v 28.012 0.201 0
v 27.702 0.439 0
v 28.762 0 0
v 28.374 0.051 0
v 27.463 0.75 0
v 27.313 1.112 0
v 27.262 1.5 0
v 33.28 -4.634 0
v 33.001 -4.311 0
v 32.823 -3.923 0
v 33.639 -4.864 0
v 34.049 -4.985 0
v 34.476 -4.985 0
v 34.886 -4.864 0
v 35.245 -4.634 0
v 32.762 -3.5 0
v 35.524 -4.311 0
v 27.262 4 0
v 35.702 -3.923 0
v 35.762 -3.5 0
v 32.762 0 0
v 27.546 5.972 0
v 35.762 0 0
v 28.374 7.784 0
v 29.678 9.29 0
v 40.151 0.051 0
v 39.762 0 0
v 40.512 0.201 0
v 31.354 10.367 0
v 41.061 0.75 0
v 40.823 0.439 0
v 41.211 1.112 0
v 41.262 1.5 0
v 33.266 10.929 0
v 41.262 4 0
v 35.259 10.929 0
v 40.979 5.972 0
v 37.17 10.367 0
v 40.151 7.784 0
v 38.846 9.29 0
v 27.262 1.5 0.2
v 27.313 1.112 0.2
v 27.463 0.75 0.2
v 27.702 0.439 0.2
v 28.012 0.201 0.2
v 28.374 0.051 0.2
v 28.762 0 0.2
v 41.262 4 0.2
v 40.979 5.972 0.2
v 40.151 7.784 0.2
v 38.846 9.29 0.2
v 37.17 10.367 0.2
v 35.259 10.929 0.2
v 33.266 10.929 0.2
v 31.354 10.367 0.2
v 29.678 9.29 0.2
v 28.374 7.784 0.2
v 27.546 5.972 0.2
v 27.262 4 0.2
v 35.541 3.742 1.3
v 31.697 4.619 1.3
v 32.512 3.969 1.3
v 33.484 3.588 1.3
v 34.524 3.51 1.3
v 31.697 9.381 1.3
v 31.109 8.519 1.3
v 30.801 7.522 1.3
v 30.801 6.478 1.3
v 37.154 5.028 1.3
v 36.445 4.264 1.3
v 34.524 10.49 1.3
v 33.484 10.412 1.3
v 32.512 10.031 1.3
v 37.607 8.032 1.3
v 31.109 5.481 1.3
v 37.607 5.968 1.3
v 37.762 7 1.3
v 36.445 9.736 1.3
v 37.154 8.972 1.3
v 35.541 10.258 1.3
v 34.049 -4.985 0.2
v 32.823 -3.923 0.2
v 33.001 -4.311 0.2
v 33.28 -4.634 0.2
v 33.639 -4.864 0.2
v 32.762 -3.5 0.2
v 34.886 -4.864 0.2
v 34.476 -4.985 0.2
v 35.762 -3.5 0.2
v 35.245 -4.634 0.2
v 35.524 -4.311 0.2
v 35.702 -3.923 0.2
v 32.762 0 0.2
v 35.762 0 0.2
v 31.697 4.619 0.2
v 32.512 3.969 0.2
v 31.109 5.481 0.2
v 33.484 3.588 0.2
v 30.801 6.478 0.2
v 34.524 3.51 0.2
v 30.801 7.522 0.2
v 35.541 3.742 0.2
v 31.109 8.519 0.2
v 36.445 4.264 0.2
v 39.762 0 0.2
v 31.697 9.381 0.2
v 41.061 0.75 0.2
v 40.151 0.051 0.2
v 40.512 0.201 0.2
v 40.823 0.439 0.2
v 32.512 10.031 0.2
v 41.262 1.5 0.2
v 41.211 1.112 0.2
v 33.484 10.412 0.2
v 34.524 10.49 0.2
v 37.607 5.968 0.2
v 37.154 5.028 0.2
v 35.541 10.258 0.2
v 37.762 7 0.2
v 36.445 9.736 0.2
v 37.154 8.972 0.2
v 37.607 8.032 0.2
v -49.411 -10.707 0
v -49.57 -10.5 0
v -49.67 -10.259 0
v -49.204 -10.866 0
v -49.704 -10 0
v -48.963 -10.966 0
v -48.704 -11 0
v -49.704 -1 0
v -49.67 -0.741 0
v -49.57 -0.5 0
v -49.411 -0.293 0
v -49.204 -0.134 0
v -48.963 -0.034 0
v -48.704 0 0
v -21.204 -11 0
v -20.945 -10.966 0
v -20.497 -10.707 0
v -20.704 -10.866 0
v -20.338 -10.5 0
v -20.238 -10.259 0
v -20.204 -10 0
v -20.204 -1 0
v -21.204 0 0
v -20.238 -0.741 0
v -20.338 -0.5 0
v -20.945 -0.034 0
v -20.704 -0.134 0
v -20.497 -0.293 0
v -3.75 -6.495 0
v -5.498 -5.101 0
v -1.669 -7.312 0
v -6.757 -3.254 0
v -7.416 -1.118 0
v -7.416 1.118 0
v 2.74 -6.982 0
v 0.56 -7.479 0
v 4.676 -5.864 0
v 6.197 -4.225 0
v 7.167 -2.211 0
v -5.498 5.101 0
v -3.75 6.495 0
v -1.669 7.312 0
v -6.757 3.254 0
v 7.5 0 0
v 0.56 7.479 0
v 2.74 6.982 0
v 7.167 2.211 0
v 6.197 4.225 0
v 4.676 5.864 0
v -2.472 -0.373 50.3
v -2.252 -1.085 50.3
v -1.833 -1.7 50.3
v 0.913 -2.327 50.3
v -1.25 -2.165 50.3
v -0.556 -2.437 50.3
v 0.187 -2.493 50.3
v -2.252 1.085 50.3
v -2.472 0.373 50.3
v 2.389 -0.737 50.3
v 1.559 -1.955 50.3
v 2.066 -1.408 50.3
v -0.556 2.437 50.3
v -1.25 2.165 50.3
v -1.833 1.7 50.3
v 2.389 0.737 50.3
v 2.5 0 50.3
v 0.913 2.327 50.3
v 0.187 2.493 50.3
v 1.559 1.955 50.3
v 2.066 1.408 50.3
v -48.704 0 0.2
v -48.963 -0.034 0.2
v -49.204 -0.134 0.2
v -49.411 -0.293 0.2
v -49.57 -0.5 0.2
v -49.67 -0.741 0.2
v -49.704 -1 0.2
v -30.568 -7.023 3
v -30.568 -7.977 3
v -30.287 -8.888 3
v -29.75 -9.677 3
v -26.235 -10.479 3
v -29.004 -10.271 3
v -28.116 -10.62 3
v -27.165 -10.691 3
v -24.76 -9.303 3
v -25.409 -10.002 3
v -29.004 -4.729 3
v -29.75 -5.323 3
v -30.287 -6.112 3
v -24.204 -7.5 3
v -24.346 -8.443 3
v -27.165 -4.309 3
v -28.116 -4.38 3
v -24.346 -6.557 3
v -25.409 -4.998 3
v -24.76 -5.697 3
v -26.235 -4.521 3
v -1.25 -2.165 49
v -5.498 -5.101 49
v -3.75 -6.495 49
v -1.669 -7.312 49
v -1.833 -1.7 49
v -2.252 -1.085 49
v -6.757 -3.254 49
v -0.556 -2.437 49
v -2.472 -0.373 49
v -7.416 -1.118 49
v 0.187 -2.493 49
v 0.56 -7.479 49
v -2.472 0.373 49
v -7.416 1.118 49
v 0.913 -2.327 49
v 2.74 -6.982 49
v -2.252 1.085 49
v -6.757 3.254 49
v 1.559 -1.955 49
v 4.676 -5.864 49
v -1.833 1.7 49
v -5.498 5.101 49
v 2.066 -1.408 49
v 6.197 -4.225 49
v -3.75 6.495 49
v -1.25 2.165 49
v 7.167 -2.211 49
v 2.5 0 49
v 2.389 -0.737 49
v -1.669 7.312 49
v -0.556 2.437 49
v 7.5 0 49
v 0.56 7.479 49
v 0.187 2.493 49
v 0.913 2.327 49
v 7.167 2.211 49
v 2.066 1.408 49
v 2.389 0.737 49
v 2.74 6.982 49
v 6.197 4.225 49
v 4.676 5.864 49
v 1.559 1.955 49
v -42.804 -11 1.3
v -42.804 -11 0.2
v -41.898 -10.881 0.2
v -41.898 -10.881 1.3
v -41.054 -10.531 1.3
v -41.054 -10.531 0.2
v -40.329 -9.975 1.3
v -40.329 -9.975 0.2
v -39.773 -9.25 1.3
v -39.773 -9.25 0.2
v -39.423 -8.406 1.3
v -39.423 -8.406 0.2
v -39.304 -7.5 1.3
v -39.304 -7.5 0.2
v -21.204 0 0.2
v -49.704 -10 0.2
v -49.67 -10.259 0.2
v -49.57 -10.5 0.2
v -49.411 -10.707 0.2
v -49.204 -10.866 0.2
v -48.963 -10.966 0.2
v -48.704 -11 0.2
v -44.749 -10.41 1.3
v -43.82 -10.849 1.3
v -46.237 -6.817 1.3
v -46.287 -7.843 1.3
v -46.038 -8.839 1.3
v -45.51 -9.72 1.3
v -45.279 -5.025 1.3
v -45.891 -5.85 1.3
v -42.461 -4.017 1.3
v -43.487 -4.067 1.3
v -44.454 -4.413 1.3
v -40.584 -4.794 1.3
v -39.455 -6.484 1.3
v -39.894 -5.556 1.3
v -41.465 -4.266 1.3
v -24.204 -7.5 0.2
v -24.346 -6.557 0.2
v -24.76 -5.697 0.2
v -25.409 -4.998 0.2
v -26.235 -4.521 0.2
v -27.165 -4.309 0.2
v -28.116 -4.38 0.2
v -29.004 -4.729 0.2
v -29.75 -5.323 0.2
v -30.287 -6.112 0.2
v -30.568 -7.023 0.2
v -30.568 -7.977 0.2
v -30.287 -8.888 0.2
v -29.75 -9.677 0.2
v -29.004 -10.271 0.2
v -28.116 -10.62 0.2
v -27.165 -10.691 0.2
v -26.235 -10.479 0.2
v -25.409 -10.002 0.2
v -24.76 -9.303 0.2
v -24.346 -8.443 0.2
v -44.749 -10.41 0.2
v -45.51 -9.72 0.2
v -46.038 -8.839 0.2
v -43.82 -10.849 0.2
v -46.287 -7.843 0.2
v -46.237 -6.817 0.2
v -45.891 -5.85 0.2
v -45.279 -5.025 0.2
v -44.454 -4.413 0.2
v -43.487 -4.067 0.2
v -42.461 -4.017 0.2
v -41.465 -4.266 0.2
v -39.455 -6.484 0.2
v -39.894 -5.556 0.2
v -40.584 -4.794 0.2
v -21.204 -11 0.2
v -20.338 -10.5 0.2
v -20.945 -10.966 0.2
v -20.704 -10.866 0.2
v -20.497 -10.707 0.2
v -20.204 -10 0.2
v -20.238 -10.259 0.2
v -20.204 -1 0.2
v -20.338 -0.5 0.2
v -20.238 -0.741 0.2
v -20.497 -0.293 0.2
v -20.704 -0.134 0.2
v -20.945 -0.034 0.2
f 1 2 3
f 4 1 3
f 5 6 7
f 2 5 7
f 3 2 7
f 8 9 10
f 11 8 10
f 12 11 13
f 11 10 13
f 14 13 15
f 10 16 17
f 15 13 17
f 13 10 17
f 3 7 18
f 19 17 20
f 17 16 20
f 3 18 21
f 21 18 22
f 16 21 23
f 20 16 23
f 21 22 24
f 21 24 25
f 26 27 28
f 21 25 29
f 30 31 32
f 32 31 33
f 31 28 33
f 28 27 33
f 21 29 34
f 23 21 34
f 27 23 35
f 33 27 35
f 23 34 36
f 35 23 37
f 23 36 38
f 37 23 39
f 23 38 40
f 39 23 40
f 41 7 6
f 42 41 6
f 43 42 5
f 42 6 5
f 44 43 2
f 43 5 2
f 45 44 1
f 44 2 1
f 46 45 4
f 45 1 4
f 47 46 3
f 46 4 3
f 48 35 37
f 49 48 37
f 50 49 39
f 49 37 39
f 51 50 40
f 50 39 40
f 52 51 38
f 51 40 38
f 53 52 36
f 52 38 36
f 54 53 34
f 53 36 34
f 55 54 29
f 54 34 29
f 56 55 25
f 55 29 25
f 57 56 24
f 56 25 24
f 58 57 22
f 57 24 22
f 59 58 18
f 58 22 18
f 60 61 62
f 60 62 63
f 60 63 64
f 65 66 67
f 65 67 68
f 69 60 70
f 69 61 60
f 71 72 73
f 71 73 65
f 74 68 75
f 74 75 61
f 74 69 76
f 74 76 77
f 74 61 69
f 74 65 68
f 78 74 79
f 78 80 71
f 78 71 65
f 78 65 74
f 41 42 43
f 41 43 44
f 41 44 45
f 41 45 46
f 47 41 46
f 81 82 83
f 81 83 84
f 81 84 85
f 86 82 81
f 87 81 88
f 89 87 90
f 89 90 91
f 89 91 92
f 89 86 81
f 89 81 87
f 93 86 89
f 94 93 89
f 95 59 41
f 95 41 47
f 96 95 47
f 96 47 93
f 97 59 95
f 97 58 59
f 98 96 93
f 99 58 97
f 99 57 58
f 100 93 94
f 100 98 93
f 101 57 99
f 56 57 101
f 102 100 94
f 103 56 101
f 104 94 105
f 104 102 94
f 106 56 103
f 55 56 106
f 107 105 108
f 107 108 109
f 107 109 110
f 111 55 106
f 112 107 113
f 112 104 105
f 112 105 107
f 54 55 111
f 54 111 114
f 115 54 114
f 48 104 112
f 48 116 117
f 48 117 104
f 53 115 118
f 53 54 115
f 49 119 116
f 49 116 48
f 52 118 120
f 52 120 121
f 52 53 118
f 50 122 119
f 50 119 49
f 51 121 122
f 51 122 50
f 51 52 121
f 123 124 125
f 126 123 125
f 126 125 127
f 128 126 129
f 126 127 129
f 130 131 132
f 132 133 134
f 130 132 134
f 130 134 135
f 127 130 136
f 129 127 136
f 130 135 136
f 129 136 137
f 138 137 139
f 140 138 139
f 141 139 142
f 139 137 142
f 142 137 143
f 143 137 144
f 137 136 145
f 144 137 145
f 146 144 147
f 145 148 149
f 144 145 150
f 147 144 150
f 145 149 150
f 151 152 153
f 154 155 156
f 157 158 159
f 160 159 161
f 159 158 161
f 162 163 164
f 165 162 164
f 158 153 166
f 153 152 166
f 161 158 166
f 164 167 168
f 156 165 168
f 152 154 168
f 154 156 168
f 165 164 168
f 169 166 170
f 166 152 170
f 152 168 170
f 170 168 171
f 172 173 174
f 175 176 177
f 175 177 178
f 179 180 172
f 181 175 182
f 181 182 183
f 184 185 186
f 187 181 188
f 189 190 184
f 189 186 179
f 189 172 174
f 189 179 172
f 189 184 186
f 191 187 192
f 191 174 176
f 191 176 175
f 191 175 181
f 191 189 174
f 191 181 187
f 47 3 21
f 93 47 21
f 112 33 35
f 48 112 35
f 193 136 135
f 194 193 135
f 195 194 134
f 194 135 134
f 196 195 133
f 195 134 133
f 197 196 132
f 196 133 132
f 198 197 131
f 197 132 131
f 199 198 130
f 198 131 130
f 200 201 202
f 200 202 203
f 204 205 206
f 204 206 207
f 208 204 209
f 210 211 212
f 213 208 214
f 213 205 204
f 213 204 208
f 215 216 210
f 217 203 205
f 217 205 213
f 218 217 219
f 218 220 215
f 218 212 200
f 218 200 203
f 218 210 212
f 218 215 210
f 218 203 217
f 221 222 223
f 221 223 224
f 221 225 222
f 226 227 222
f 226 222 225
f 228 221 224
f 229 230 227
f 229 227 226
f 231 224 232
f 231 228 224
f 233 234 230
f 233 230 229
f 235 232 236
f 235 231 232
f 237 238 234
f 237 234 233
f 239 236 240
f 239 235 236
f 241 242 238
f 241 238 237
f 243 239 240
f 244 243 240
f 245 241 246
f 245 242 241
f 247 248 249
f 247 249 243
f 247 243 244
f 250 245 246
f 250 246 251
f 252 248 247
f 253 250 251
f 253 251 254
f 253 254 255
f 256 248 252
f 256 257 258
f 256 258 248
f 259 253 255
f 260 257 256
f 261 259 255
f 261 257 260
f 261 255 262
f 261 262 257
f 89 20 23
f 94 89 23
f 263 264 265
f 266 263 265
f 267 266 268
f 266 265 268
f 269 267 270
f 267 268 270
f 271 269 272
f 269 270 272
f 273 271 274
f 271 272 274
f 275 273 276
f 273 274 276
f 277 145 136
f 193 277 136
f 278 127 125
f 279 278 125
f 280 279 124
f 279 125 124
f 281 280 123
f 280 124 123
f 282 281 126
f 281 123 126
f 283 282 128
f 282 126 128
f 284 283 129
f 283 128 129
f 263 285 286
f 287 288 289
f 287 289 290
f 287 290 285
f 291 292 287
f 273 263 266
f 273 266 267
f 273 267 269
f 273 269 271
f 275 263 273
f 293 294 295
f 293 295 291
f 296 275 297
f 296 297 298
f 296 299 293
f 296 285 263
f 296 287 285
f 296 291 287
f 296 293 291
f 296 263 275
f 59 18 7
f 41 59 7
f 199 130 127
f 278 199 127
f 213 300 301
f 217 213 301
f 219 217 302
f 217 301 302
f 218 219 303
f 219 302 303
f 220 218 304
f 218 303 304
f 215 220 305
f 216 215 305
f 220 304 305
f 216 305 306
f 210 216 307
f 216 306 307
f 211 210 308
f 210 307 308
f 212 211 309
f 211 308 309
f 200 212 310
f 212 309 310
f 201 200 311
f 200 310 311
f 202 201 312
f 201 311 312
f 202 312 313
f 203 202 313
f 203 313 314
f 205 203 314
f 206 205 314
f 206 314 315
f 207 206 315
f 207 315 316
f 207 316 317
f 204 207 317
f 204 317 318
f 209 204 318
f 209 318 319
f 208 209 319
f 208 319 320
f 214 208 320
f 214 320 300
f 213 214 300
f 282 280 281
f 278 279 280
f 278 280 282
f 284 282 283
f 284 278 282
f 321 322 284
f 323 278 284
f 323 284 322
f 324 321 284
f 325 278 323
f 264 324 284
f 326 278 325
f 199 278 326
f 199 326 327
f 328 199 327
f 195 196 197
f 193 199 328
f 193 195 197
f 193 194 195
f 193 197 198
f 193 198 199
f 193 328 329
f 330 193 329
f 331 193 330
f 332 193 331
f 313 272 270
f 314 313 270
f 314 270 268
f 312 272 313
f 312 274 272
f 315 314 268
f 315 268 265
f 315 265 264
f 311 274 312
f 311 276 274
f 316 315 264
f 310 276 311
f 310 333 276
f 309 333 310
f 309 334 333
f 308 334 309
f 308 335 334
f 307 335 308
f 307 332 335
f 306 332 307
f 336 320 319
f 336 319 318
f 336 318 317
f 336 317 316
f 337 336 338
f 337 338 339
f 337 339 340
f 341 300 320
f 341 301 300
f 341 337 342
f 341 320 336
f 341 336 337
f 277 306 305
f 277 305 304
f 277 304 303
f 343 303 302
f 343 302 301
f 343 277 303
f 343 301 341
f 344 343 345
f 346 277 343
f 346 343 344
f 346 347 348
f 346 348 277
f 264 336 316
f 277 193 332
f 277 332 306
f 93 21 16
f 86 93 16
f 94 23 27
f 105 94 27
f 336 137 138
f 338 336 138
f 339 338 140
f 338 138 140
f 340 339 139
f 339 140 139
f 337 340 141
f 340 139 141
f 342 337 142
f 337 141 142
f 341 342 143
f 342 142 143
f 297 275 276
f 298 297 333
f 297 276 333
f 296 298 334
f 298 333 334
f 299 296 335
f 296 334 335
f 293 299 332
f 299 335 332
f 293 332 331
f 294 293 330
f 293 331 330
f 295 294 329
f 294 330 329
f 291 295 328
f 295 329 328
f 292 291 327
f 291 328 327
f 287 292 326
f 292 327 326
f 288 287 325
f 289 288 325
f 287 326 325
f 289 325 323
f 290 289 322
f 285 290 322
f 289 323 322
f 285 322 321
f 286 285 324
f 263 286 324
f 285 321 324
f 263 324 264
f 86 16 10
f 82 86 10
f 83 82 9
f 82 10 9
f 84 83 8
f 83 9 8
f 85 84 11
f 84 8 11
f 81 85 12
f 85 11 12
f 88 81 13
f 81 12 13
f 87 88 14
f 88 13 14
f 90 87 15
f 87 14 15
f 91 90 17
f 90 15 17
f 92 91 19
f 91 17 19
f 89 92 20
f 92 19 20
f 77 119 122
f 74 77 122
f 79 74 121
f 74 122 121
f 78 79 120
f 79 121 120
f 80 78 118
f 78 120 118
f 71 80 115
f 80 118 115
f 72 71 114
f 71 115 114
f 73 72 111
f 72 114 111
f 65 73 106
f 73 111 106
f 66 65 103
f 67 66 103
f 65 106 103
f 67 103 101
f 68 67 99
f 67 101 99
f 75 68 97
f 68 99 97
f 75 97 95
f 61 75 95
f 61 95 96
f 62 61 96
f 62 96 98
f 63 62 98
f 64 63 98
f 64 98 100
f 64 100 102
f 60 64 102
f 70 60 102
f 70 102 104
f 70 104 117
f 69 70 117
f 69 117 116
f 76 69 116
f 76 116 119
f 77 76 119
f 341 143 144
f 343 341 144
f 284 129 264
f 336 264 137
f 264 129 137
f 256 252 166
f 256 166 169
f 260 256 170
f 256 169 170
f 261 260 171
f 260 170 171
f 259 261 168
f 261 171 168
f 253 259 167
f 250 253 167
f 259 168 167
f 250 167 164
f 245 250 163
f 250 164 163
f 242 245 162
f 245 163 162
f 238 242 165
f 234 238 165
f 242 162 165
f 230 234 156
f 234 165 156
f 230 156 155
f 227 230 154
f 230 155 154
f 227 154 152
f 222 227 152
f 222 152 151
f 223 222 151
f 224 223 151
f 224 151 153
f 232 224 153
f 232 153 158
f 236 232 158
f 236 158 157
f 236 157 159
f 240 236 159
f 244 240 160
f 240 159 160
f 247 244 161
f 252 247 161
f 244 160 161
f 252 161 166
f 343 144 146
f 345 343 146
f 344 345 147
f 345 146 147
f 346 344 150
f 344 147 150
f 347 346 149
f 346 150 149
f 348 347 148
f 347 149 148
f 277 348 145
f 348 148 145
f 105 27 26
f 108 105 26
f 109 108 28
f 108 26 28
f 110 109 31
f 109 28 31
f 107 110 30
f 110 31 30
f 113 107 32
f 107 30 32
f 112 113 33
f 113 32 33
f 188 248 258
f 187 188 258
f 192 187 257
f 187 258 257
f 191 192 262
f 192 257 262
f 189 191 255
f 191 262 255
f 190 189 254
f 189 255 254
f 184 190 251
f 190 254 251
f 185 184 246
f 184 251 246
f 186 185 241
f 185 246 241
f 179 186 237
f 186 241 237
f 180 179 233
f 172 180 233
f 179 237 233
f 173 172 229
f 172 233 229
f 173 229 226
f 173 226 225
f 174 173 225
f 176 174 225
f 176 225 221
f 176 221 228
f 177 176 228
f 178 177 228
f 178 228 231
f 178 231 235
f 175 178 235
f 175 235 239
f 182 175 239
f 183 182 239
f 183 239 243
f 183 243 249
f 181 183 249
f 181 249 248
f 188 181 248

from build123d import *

# Parameters (mm, degrees)
F0_R     = 3.2
F1_DEPTH = 0.2
F2_DEPTH = 1.3
F3_DEPTH = 3
F0_R_2   = 7.5
F0_R_3   = 2.5
F4_DEPTH = 49
F5_DEPTH = 50.3
F0_R_4   = 3.5
F6_DEPTH = 0.2
F7_DEPTH = 1.3


with BuildPart() as f1:
    # F0 (on Top) → F1 (new body)
    with BuildSketch(Plane.XY):
        with BuildLine():
            Line((-21.204038, 0), (-48.704038, 0))
            ThreePointArc((-48.704038, 0), (-49.411145, -0.292893), (-49.704038, -1))
            Line((-49.704038, -1), (-49.704038, -10))
            ThreePointArc((-49.704038, -10), (-49.411145, -10.707107), (-48.704038, -11))
            Line((-48.704038, -11), (-42.804038, -11))
            Line((-42.804038, -11), (-21.204038, -11))
            ThreePointArc((-21.204038, -11), (-20.496931, -10.707107), (-20.204038, -10))
            Line((-20.204038, -10), (-20.204038, -1))
            ThreePointArc((-20.204038, -1), (-20.496931, -0.292893), (-21.204038, 0))
        make_face()
        with BuildLine():
            ThreePointArc((-39.304038, -7.5), (-40.329164, -9.974874), (-42.804038, -11))
            ThreePointArc((-42.804038, -11), (-45.278912, -5.025126), (-39.304038, -7.5))
        make_face(mode=Mode.SUBTRACT)
        with Locations((-27.404038, -7.5)):
            Circle(F0_R, mode=Mode.SUBTRACT)
        with BuildLine():
            ThreePointArc((-39.304038, -7.5), (-45.278912, -5.025126), (-42.804038, -11))
            ThreePointArc((-42.804038, -11), (-40.329164, -9.974874), (-39.304038, -7.5))
        make_face()
        with Locations((-27.404038, -7.5)):
            Circle(F0_R)
    extrude(amount=F1_DEPTH)

    # F0 (on Top) → F2 (join)
    with BuildSketch(Plane.XY):
        with BuildLine():
            ThreePointArc((-39.304038, -7.5), (-45.278912, -5.025126), (-42.804038, -11))
            ThreePointArc((-42.804038, -11), (-40.329164, -9.974874), (-39.304038, -7.5))
        make_face()
    extrude(amount=F2_DEPTH)

    # F0 (on Top) → F3 (join)
    with BuildSketch(Plane.XY):
        with Locations((-27.404038, -7.5)):
            Circle(F0_R)
    extrude(amount=F3_DEPTH)


with BuildPart() as f4:
    # F0 (on Top) → F4 (new body)
    with BuildSketch(Plane.XY):
        Circle(F0_R_2)
        Circle(F0_R_3, mode=Mode.SUBTRACT)
        Circle(F0_R_3)
    extrude(amount=F4_DEPTH)

    # F0 (on Top) → F5 (join)
    with BuildSketch(Plane.XY):
        Circle(F0_R_3)
    extrude(amount=F5_DEPTH)


with BuildPart() as f6:
    # F0 (on Top) → F6 (new body)
    with BuildSketch(Plane.XY):
        with BuildLine():
            Line((35.762385, 0), (32.762385, 0))
            Line((32.762385, 0), (32.762385, -3.5))
            ThreePointArc((32.762385, -3.5), (34.262385, -5), (35.762385, -3.5))
            Line((35.762385, -3.5), (35.762385, 0))
        make_face()
        with BuildLine():
            ThreePointArc((27.262385, 1.5), (27.701725, 0.43934), (28.762385, 0))
            Line((28.762385, 0), (32.762385, 0))
            Line((32.762385, 0), (35.762385, 0))
            Line((35.762385, 0), (39.762385, 0))
            ThreePointArc((39.762385, 0), (40.823045, 0.43934), (41.262385, 1.5))
            Line((41.262385, 1.5), (41.262385, 4))
            ThreePointArc((41.262385, 4), (34.262385, 11), (27.262385, 4))
            Line((27.262385, 4), (27.262385, 1.5))
        make_face()
        with Locations((34.262385, 7)):
            Circle(F0_R_4, mode=Mode.SUBTRACT)
        with Locations((34.262385, 7)):
            Circle(F0_R_4)
    extrude(amount=F6_DEPTH)

    # F0 (on Top) → F7 (join)
    with BuildSketch(Plane.XY):
        with Locations((34.262385, 7)):
            Circle(F0_R_4)
    extrude(amount=F7_DEPTH)


solid = Compound([f1.part, f4.part, f6.part])
